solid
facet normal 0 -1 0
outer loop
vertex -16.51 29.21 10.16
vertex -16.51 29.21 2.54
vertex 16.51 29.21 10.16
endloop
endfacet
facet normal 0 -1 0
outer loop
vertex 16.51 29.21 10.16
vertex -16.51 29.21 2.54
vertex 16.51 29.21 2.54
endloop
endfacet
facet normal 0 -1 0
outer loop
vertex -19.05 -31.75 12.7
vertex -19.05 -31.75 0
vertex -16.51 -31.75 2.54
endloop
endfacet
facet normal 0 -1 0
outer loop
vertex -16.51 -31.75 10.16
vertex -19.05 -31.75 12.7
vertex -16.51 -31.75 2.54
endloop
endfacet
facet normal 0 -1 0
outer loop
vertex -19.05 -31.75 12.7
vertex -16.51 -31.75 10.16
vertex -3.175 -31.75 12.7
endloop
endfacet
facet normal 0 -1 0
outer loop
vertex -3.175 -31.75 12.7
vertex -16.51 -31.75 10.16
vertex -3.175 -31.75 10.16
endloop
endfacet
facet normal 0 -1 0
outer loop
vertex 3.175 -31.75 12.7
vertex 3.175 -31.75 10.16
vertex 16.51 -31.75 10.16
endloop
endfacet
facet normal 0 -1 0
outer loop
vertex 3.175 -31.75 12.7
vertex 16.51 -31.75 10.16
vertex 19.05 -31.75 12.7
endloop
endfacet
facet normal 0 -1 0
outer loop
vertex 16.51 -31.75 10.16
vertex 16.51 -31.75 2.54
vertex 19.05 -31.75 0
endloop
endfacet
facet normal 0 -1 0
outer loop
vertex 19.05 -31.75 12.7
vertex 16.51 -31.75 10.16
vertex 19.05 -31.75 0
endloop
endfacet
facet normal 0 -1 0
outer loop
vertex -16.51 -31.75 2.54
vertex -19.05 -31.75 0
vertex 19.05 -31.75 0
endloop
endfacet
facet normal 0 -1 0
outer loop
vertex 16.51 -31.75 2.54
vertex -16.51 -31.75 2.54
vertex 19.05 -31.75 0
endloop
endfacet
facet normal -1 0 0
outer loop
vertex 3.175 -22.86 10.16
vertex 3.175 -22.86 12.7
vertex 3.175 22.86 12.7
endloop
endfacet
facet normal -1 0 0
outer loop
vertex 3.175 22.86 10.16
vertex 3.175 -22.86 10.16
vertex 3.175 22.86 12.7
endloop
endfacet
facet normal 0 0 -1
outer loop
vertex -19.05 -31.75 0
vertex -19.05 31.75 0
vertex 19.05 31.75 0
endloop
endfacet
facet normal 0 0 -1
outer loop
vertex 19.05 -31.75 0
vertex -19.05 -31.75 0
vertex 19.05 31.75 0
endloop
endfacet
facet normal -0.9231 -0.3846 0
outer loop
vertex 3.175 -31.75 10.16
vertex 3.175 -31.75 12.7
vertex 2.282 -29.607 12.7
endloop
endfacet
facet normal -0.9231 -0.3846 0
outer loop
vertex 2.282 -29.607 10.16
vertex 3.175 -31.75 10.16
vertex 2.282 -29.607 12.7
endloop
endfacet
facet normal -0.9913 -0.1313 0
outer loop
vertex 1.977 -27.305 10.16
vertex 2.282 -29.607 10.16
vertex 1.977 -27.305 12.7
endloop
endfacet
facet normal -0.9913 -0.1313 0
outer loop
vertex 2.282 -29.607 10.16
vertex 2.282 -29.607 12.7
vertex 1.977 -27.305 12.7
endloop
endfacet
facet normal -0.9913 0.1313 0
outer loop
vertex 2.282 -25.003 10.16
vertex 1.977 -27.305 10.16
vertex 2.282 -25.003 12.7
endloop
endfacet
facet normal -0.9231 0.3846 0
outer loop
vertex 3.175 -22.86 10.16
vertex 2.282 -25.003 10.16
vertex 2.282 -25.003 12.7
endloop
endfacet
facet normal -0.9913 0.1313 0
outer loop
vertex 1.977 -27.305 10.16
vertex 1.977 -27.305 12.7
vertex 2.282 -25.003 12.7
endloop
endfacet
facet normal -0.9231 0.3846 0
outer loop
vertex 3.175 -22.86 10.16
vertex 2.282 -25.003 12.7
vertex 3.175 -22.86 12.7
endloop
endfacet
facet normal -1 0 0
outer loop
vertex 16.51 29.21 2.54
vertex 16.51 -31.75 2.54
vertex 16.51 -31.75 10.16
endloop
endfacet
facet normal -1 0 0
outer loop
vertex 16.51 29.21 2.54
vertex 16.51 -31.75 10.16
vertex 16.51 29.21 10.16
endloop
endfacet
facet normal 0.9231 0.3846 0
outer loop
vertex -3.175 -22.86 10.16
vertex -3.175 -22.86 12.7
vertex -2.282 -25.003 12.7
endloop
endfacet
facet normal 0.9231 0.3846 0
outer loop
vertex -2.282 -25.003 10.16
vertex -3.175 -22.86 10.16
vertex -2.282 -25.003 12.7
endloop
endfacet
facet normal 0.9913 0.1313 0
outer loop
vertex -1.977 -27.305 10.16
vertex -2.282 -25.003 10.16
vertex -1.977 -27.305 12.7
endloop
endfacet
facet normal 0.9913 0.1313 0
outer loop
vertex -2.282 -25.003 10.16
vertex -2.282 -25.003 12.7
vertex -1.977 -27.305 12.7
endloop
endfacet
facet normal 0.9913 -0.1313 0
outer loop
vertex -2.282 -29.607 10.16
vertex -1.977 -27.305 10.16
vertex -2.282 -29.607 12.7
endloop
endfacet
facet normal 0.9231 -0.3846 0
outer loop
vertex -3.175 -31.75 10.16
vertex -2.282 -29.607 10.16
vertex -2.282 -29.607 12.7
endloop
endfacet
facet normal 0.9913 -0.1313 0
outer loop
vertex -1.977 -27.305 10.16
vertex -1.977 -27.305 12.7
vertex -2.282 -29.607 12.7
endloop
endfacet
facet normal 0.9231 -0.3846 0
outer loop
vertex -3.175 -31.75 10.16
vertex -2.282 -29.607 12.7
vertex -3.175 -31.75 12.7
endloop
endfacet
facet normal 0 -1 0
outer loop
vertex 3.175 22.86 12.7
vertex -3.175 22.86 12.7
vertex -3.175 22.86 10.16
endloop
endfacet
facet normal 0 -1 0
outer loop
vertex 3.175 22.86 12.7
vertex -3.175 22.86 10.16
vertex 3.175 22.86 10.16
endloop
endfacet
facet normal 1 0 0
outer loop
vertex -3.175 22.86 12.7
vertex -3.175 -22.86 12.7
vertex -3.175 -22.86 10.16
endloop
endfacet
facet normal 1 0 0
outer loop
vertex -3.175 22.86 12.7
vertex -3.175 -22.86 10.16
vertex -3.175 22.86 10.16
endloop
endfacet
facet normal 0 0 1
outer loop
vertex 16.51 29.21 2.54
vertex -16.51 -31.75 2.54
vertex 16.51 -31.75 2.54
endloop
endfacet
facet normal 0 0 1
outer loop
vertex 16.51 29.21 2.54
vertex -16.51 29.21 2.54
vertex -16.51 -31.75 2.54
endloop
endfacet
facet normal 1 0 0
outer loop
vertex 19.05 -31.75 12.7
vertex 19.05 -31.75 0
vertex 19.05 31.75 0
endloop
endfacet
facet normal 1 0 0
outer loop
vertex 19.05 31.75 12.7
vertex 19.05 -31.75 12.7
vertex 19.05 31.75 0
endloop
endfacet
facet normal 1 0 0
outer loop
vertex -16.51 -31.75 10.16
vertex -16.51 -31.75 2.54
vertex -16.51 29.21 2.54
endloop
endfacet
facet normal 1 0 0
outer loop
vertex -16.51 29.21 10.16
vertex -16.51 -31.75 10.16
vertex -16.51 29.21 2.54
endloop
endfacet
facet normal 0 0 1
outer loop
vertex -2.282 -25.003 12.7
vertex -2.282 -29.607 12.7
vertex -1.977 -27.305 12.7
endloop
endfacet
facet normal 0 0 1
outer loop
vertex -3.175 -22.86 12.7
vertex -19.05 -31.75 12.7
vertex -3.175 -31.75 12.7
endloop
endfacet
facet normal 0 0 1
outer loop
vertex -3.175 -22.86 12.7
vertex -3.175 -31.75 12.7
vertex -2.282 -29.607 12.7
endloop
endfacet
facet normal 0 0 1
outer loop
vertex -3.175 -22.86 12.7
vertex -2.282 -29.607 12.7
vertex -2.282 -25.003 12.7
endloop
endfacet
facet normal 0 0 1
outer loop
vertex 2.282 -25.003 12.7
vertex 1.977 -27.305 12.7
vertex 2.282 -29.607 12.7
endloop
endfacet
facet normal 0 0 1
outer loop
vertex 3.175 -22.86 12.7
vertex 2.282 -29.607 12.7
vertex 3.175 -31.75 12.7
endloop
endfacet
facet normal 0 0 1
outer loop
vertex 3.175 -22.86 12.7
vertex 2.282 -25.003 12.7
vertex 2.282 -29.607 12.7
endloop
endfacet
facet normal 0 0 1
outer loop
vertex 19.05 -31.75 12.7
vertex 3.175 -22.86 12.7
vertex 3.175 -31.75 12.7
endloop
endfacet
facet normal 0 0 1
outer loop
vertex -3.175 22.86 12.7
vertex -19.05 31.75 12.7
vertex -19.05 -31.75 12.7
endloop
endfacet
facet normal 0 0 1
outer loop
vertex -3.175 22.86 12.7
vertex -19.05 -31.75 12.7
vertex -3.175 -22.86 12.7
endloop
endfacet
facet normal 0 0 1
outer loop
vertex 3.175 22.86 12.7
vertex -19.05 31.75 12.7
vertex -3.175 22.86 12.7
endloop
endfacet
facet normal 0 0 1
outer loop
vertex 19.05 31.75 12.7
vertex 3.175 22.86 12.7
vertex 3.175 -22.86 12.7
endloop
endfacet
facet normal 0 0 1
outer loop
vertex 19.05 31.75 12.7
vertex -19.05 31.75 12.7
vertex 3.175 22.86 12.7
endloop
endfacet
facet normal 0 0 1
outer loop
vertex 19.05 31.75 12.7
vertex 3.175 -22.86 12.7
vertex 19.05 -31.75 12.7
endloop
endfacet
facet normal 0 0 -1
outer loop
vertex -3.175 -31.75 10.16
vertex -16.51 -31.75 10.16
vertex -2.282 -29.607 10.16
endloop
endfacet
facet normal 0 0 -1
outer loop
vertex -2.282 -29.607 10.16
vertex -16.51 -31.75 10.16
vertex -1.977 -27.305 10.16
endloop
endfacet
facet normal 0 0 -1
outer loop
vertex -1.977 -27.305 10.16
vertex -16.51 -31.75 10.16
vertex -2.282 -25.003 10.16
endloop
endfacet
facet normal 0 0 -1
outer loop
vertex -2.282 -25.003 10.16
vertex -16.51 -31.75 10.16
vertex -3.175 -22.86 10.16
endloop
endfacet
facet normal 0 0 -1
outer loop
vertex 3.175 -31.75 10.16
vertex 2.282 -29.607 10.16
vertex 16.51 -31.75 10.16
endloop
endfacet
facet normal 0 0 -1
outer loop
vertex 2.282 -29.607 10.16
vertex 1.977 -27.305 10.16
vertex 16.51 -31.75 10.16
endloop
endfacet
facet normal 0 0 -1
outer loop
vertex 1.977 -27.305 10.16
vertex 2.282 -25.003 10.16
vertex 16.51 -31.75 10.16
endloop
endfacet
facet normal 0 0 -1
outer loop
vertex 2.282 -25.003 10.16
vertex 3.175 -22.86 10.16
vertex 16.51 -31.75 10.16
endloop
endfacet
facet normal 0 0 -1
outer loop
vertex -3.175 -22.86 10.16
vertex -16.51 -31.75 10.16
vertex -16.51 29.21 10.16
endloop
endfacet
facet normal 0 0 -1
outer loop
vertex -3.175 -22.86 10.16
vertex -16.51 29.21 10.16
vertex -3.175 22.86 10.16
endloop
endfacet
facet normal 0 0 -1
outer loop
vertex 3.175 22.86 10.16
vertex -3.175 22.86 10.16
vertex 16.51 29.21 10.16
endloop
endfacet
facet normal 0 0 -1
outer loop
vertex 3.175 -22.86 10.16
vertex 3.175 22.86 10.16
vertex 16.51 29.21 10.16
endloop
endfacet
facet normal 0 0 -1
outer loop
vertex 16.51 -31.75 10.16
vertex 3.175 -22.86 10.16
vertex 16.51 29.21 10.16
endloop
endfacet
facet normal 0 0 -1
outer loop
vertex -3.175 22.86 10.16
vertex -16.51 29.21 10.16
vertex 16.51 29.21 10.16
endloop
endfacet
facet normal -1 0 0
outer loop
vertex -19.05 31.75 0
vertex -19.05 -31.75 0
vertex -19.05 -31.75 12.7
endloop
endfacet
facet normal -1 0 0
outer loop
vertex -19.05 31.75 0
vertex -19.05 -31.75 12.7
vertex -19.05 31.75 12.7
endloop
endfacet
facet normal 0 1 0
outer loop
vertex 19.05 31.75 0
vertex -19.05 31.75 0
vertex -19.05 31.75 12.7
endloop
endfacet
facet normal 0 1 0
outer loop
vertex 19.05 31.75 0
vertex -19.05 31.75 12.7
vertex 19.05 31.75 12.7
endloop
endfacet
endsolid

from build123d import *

# Parameters (mm, degrees)
F0_W     = 38.1
F0_H     = 63.5
F1_DEPTH = 12.7
F2_T     = -2.54
F3_W     = 6.35
F3_H     = 45.72
F4_DEPTH = 2.54


with BuildPart() as f1:
    # F0 (on Top) → F1 (new body)
    with BuildSketch(Plane.XY):
        Rectangle(F0_W, F0_H)
    extrude(amount=F1_DEPTH)

    # F2
    f2_openings = [f1.faces().sort_by_distance(p)[0] for p in [
        (0, -31.75, 6.35),
    ]]
    offset(amount=F2_T, openings=f2_openings)

    # F3 (on face) → F4 (cut, through all)
    with BuildSketch(Plane.XY.offset(12.7)):
        Rectangle(F3_W, F3_H)
        with BuildLine():
            ThreePointArc((3.175, -31.75), (1.976942, -27.305), (3.175, -22.86))
            Line((3.175, -22.86), (-3.175, -22.86))
            ThreePointArc((-3.175, -22.86), (-1.976942, -27.305), (-3.175, -31.75))
            Line((-3.175, -31.75), (3.175, -31.75))
        make_face()
    extrude(amount=-F4_DEPTH, mode=Mode.SUBTRACT)


solid = f1.part
